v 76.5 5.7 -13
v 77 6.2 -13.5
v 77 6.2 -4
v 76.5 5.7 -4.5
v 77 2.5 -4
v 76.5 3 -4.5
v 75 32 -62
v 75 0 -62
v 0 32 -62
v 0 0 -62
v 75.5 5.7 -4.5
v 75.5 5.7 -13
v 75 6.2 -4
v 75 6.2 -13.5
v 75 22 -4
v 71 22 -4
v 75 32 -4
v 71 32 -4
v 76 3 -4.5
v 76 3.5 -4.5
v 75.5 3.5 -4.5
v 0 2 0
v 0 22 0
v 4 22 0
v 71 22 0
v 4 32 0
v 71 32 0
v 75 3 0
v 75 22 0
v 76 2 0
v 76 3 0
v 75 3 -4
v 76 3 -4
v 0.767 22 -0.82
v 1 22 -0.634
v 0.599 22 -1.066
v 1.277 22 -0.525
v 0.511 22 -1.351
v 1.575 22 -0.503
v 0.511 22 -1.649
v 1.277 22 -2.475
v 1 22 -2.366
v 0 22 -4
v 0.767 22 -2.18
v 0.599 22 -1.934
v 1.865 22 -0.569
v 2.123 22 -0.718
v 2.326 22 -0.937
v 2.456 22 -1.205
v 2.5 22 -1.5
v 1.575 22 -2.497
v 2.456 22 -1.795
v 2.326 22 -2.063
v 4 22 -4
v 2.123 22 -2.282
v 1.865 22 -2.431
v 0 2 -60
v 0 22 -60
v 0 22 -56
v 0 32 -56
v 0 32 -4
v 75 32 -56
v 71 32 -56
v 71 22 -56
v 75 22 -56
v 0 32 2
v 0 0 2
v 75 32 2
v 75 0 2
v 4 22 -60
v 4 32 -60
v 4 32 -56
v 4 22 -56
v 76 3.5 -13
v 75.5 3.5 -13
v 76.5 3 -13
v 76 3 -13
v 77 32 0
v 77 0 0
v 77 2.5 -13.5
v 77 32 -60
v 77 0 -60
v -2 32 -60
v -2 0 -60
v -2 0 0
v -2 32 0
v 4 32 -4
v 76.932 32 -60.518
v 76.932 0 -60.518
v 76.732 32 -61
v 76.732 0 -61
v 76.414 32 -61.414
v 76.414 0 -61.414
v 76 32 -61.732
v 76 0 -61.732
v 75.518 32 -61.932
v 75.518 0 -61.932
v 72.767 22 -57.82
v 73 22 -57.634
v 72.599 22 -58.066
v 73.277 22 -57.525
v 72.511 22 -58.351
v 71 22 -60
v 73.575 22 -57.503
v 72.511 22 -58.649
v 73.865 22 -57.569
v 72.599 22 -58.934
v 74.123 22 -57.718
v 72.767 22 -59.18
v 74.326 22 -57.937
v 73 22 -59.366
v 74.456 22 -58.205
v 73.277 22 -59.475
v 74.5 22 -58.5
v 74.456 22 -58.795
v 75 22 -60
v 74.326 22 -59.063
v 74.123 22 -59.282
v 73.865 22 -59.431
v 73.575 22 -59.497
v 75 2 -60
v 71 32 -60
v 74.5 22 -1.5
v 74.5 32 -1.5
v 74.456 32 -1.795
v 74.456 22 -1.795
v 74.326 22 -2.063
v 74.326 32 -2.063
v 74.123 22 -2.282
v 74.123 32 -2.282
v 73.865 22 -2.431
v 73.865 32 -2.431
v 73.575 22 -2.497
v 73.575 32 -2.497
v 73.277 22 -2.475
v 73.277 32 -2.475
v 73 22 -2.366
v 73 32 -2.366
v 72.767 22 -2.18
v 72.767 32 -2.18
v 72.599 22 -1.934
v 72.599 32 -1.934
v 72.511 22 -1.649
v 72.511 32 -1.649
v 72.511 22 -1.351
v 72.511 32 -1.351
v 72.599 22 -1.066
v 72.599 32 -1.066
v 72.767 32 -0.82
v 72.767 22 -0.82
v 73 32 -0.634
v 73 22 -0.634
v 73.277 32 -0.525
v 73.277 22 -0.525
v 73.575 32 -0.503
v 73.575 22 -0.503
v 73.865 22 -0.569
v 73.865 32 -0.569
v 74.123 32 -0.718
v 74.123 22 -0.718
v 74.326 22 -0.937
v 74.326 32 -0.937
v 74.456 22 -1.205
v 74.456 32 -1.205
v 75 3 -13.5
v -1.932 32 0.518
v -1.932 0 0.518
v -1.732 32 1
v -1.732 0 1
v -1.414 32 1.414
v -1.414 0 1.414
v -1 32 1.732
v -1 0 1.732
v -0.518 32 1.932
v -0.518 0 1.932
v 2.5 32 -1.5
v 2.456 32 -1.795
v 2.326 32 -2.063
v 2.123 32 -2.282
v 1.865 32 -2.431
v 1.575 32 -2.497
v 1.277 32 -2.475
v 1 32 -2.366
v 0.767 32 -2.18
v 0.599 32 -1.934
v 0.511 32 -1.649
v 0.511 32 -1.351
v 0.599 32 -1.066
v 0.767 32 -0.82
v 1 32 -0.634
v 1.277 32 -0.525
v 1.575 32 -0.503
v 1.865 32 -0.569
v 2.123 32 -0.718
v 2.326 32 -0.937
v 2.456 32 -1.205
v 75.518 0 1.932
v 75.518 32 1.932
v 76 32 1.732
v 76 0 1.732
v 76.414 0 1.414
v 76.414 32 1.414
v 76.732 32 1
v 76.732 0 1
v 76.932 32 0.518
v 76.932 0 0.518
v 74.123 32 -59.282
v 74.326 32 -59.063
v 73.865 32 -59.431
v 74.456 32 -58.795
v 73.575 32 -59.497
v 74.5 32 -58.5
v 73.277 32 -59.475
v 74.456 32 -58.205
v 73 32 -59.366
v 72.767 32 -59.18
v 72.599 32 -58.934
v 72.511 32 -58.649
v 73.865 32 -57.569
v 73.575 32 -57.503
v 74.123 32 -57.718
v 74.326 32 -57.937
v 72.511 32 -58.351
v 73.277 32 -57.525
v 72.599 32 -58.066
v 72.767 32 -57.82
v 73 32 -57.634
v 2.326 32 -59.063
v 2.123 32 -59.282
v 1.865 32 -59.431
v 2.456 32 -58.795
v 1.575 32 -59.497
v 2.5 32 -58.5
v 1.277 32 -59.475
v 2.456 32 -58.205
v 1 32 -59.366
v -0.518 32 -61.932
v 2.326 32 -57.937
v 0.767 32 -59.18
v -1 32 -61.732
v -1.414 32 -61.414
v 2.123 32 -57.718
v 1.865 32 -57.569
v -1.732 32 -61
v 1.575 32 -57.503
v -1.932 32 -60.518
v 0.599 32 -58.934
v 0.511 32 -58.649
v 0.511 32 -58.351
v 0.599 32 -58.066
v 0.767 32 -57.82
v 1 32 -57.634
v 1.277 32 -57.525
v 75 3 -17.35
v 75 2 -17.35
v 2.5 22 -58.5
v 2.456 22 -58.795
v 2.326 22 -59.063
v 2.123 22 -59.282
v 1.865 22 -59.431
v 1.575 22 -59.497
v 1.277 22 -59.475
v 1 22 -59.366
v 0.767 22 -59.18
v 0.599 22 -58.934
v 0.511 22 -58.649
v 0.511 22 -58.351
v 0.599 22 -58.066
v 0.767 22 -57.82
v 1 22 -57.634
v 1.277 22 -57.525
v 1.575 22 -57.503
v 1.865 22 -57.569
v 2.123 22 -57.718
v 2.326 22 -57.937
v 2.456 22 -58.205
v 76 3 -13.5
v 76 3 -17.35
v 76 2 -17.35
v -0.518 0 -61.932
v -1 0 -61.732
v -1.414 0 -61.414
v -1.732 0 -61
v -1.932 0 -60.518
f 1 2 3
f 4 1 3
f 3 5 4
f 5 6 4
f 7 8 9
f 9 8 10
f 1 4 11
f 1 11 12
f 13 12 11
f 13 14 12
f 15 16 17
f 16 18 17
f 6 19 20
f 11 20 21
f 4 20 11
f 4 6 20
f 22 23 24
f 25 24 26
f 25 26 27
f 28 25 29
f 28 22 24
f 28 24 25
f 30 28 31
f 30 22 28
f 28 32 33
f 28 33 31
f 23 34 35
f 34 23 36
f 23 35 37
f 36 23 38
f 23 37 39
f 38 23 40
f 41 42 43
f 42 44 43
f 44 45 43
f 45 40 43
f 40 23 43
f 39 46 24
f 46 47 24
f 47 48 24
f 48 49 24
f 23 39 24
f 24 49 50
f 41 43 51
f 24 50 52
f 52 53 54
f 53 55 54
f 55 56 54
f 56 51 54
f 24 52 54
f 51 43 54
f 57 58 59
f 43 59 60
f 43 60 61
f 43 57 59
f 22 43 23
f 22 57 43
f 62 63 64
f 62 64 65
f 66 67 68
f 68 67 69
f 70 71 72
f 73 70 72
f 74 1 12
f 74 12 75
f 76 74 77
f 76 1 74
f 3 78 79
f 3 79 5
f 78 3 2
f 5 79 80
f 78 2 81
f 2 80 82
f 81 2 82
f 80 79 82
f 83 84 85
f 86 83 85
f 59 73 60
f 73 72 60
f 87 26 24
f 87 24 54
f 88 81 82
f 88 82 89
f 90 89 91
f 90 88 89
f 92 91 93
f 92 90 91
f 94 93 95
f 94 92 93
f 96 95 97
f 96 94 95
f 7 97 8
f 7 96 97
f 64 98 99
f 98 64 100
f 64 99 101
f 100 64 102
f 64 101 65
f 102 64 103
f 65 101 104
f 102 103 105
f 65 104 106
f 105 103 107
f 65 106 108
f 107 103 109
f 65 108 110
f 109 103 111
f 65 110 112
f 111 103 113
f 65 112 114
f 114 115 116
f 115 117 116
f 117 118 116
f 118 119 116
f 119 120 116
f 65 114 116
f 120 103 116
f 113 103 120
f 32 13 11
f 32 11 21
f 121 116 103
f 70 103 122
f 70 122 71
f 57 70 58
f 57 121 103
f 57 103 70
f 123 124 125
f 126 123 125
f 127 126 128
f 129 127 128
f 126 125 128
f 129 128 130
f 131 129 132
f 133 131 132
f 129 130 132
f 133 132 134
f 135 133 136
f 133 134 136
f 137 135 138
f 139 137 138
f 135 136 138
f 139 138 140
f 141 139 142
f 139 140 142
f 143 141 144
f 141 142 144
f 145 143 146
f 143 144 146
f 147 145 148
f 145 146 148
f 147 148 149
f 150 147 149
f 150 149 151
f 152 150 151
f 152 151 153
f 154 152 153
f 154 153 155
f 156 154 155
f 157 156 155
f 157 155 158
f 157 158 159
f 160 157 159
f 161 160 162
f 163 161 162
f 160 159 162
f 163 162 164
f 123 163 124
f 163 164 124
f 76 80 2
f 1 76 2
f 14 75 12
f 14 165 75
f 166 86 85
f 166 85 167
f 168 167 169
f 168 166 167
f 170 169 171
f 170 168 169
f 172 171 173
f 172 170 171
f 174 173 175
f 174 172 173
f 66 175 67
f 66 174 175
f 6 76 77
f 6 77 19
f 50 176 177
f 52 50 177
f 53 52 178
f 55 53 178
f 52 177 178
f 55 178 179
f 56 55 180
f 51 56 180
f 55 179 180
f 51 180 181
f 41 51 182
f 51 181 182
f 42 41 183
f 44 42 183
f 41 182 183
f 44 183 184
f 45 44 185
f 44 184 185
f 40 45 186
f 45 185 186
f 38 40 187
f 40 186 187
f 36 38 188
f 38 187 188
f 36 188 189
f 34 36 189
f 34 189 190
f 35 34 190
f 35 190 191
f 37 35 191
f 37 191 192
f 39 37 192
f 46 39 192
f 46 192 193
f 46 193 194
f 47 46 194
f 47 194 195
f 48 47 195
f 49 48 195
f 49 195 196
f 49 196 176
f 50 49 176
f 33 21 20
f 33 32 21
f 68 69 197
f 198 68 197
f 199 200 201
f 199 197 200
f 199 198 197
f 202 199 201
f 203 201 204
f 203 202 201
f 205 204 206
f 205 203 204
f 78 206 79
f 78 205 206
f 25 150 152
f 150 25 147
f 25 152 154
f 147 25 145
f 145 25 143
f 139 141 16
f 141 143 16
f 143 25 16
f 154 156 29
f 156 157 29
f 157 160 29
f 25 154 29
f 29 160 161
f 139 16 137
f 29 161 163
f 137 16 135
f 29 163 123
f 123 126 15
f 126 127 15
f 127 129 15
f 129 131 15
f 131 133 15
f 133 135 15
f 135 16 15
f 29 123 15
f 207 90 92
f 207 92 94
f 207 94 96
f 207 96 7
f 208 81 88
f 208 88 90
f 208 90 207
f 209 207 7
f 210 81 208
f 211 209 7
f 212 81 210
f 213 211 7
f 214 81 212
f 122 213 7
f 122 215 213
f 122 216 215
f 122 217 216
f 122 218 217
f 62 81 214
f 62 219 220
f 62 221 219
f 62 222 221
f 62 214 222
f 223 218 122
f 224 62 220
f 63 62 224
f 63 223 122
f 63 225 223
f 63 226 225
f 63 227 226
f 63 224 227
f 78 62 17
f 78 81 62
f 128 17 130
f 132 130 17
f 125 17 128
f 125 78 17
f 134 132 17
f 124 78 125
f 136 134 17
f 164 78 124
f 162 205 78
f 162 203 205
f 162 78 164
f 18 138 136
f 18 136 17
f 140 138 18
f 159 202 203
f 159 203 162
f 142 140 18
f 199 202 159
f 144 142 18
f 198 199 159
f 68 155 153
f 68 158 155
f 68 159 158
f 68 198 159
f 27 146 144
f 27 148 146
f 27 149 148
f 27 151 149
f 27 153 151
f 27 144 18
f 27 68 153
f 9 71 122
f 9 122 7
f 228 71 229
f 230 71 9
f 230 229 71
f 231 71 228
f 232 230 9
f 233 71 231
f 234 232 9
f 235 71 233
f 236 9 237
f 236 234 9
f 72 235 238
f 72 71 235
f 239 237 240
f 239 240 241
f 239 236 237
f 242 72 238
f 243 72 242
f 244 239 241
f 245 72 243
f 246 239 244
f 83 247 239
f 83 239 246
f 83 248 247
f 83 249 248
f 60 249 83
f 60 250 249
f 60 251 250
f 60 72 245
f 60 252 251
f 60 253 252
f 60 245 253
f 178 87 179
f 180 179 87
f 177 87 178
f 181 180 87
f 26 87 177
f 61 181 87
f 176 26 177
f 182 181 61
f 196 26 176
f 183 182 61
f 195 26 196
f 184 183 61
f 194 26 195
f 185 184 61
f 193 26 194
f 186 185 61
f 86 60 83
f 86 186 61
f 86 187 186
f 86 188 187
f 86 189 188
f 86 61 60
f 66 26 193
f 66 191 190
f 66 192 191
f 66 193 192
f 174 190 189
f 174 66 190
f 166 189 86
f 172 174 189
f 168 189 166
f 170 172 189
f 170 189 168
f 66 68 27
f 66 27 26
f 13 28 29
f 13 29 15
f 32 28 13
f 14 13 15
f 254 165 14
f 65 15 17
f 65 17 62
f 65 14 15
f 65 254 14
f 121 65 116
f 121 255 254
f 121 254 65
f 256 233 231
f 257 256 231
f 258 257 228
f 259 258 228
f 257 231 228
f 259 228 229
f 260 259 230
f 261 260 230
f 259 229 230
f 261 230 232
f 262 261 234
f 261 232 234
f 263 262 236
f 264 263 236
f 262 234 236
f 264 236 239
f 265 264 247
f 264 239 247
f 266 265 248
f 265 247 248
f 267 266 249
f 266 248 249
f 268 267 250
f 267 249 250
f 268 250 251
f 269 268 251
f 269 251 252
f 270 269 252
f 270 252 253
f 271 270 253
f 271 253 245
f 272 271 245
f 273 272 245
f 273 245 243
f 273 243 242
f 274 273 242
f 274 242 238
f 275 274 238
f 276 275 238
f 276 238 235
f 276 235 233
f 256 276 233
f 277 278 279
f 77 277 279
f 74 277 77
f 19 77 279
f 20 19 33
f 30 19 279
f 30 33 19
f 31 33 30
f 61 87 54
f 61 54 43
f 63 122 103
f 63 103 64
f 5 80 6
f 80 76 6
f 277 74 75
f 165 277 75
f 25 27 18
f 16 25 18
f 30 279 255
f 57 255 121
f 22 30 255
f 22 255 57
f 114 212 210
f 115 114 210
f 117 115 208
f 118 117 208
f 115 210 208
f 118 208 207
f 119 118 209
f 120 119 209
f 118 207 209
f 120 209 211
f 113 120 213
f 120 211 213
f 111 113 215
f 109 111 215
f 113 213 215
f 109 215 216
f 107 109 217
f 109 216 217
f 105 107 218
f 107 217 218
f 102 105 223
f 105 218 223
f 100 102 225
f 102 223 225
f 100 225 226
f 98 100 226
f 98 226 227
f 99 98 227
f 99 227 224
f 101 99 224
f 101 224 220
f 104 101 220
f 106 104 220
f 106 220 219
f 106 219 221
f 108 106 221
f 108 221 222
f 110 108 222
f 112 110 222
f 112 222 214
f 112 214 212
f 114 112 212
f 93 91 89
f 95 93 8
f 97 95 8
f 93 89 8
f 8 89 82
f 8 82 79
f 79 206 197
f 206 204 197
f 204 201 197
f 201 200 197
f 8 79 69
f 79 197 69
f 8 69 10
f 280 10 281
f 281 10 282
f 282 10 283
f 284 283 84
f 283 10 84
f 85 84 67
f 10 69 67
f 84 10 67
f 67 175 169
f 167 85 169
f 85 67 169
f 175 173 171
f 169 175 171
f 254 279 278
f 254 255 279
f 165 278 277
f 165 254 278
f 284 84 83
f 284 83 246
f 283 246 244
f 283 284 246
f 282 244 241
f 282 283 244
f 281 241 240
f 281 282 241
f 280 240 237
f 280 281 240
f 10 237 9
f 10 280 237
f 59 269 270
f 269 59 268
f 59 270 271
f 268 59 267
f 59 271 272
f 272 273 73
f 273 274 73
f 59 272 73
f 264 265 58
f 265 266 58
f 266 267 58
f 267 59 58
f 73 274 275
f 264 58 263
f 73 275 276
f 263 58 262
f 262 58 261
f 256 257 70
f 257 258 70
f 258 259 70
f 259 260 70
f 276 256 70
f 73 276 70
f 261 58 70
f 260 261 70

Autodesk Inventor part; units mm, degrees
ref_plane "YZ Plane" through (0, 0, 0) normal (1, 0, 0) x (0, 1, 0)
ref_plane "XZ Plane" through (0, 0, 0) normal (0, 1, 0) x (-1, 0, 0)
ref_plane "XY Plane" through (0, 0, 0) normal (0, 0, 1) x (1, 0, 0)
sketch "Náčrt1" plane through (0, 0, 0) normal (0, 1, 0) x (-1, 0, 0)
  line L0 (0, 0) -> (-75, 0)
  line L1 (-75, 0) -> (-75, -60)
  line L2 (-75, -60) -> (0, -60)
  line L3 (0, -60) -> (0, 0)
  line L4 (2, 2) -> (-77, 2)
  line L5 (-77, 2) -> (-77, -62)
  line L6 (-77, -62) -> (2, -62)
  line L7 (2, -62) -> (2, 2)
  dimension "d0" = 60
  dimension "d1" = 75
  dimension "d2" = 2
  dimension "d3" = 2
  dimension "d4" = 2
  dimension "d5" = 2
extrude "Vysunutí1" add sketch "Náčrt1" along normal blind 2 contours L3 L2 L1 L0
extrude "Vysunutí2" add sketch "Náčrt1" along normal blind 32
sketch "Náčrt2" plane through (0, 32, 0) normal (0, 1, 0) x (1, 0, 0)
  line L0 (-2, -2) -> (4, -2)
  line L1 (4, -2) -> (4, 4)
  line L2 (4, 4) -> (-2, 4)
  line L3 (-2, 4) -> (-2, -2)
  line L4 (77, 62) -> (-2, 62) projected
  line L5 (-2, 62) -> (4, 62)
  line L6 (4, 62) -> (4, 56)
  line L7 (4, 56) -> (-2, 56)
  line L8 (-2, 56) -> (-2, 62)
  line L9 (77, -2) -> (77, 62) projected
  line L10 (77, 62) -> (71, 62)
  line L11 (71, 62) -> (71, 56)
  line L12 (71, 56) -> (77, 56)
  line L13 (77, 56) -> (77, 62)
  line L14 (77, -2) -> (71, -2)
  line L15 (71, -2) -> (71, 4)
  line L16 (71, 4) -> (77, 4)
  line L17 (77, 4) -> (77, -2)
  point P0 (0, 0)
  dimension "d10" = 6
  dimension "d11" = 6
  dimension "d12" = 6
  dimension "d13" = 6
  dimension "d14" = 6
  dimension "d15" = 6
  dimension "d16" = 6
  dimension "d17" = 6
extrude "Vysunutí3" add sketch "Náčrt2" against normal blind 10
sketch "Náčrt3" plane through (0, 32, 0) normal (0, 1, 0) x (1, 0, 0)
  circle A0 centre (1.5, 58.5) radius 1
  line L0 (77, 62) -> (-2, 62) projected
  line L1 (-2, 62) -> (-2, -2) projected
  circle A1 centre (73.5, 58.5) radius 1
  line L2 (77, -2) -> (77, 62) projected
  circle A2 centre (73.5, 1.5) radius 1
  line L3 (-2, -2) -> (77, -2) projected
  circle A3 centre (1.5, 1.5) radius 1
  point P0 (0, 0)
  dimension "d20" = 2
  dimension "d21" = 3.5
  dimension "d22" = 3.5
  dimension "d23" = 2
  dimension "d24" = 3.5
  dimension "d25" = 3.5
  dimension "d26" = 2
  dimension "d27" = 3.5
  dimension "d28" = 3.5
  dimension "d29" = 2
  dimension "d30" = 3.5
  dimension "d31" = 3.5
extrude "Vysunutí4" cut sketch "Náčrt3" against normal blind 10 contours A0 | A1 | A2 | A3
sketch "Náčrt4" plane through (77, 0, 2) normal (1, 0, 0) x (0, 0, -1)
  line L0 (2, 2) -> (2, 22) projected
  line L1 (6.5, 5.7) -> (15, 5.7)
  line L2 (15, 5.7) -> (15, 3)
  line L3 (15, 3) -> (6.5, 3)
  line L4 (6.5, 3) -> (6.5, 5.7)
  line L5 (0, 0) -> (64, 0) projected
  point P0 (2, 0)
  dimension "d36" = 3
  dimension "d37" = 4.5
  dimension "d38" = 8.5
  dimension "d39" = 2.7
extrude "Vysunutí5" cut sketch "Náčrt4" against normal blind 10
sketch "Náčrt5" plane through (75, 2, -60) normal (-1, 0, 0) x (0, 0, 1)
  line L0 (60, 0) -> (0, 0) projected
  line L1 (42.65, 1) -> (60, 1)
  line L2 (60, 1) -> (60, 0)
  line L3 (60, 0) -> (42.65, 0)
  line L4 (42.65, 0) -> (42.65, 1)
  line L5 (60, 0) -> (60, 20) projected
  point P0 (60, -2)
  point P1 (60, 0.5)
  point P2 (42.65, 0)
  dimension "d42" = 17.35
  dimension "d43" = 1
extrude "Vysunutí6" cut sketch "Náčrt5" against normal blind 1
chamfer "Zkosení1" distance 0.5 angle 45 5 edges at (75.5, 3, -13) (75.5, 3, -4.5) (75, 4.35, -4.5) (75, 4.35, -13) (75, 5.7, -8.75)
chamfer "Zkosení2" distance 0.5 angle 45 4 edges at (77, 5.7, -8.75) (77, 4.35, -4.5) (77, 3, -8.75) (77, 4.35, -13)
sketch "Náčrt6" plane through (77, 0, 2) normal (1, 0, 0) x (0, 0, -1)
  point P0 (2, 0)
fillet "Zaoblení1" radius 2 4 edges at (77, 16, 2) (77, 16, -62) (-2, 16, -62) (-2, 16, 2)
equation "\"d3\" = d2"
equation "\"d4\" = d2"
equation "\"d5\" = d2"
equation "\"d12\" = d10"
equation "\"d13\" = d10"
equation "\"d14\" = d10"
equation "\"d15\" = d10"
equation "\"d16\" = d10"
equation "\"d23\" = d20"
equation "\"d24\" = d21"
equation "\"d25\" = d21"
equation "\"d26\" = d20"
equation "\"d27\" = d21"
equation "\"d28\" = d21"
equation "\"d29\" = d20"
equation "\"d30\" = d21"
equation "\"d31\" = d21"
properties part number "BH1750-case" material "PVC potrubí"
